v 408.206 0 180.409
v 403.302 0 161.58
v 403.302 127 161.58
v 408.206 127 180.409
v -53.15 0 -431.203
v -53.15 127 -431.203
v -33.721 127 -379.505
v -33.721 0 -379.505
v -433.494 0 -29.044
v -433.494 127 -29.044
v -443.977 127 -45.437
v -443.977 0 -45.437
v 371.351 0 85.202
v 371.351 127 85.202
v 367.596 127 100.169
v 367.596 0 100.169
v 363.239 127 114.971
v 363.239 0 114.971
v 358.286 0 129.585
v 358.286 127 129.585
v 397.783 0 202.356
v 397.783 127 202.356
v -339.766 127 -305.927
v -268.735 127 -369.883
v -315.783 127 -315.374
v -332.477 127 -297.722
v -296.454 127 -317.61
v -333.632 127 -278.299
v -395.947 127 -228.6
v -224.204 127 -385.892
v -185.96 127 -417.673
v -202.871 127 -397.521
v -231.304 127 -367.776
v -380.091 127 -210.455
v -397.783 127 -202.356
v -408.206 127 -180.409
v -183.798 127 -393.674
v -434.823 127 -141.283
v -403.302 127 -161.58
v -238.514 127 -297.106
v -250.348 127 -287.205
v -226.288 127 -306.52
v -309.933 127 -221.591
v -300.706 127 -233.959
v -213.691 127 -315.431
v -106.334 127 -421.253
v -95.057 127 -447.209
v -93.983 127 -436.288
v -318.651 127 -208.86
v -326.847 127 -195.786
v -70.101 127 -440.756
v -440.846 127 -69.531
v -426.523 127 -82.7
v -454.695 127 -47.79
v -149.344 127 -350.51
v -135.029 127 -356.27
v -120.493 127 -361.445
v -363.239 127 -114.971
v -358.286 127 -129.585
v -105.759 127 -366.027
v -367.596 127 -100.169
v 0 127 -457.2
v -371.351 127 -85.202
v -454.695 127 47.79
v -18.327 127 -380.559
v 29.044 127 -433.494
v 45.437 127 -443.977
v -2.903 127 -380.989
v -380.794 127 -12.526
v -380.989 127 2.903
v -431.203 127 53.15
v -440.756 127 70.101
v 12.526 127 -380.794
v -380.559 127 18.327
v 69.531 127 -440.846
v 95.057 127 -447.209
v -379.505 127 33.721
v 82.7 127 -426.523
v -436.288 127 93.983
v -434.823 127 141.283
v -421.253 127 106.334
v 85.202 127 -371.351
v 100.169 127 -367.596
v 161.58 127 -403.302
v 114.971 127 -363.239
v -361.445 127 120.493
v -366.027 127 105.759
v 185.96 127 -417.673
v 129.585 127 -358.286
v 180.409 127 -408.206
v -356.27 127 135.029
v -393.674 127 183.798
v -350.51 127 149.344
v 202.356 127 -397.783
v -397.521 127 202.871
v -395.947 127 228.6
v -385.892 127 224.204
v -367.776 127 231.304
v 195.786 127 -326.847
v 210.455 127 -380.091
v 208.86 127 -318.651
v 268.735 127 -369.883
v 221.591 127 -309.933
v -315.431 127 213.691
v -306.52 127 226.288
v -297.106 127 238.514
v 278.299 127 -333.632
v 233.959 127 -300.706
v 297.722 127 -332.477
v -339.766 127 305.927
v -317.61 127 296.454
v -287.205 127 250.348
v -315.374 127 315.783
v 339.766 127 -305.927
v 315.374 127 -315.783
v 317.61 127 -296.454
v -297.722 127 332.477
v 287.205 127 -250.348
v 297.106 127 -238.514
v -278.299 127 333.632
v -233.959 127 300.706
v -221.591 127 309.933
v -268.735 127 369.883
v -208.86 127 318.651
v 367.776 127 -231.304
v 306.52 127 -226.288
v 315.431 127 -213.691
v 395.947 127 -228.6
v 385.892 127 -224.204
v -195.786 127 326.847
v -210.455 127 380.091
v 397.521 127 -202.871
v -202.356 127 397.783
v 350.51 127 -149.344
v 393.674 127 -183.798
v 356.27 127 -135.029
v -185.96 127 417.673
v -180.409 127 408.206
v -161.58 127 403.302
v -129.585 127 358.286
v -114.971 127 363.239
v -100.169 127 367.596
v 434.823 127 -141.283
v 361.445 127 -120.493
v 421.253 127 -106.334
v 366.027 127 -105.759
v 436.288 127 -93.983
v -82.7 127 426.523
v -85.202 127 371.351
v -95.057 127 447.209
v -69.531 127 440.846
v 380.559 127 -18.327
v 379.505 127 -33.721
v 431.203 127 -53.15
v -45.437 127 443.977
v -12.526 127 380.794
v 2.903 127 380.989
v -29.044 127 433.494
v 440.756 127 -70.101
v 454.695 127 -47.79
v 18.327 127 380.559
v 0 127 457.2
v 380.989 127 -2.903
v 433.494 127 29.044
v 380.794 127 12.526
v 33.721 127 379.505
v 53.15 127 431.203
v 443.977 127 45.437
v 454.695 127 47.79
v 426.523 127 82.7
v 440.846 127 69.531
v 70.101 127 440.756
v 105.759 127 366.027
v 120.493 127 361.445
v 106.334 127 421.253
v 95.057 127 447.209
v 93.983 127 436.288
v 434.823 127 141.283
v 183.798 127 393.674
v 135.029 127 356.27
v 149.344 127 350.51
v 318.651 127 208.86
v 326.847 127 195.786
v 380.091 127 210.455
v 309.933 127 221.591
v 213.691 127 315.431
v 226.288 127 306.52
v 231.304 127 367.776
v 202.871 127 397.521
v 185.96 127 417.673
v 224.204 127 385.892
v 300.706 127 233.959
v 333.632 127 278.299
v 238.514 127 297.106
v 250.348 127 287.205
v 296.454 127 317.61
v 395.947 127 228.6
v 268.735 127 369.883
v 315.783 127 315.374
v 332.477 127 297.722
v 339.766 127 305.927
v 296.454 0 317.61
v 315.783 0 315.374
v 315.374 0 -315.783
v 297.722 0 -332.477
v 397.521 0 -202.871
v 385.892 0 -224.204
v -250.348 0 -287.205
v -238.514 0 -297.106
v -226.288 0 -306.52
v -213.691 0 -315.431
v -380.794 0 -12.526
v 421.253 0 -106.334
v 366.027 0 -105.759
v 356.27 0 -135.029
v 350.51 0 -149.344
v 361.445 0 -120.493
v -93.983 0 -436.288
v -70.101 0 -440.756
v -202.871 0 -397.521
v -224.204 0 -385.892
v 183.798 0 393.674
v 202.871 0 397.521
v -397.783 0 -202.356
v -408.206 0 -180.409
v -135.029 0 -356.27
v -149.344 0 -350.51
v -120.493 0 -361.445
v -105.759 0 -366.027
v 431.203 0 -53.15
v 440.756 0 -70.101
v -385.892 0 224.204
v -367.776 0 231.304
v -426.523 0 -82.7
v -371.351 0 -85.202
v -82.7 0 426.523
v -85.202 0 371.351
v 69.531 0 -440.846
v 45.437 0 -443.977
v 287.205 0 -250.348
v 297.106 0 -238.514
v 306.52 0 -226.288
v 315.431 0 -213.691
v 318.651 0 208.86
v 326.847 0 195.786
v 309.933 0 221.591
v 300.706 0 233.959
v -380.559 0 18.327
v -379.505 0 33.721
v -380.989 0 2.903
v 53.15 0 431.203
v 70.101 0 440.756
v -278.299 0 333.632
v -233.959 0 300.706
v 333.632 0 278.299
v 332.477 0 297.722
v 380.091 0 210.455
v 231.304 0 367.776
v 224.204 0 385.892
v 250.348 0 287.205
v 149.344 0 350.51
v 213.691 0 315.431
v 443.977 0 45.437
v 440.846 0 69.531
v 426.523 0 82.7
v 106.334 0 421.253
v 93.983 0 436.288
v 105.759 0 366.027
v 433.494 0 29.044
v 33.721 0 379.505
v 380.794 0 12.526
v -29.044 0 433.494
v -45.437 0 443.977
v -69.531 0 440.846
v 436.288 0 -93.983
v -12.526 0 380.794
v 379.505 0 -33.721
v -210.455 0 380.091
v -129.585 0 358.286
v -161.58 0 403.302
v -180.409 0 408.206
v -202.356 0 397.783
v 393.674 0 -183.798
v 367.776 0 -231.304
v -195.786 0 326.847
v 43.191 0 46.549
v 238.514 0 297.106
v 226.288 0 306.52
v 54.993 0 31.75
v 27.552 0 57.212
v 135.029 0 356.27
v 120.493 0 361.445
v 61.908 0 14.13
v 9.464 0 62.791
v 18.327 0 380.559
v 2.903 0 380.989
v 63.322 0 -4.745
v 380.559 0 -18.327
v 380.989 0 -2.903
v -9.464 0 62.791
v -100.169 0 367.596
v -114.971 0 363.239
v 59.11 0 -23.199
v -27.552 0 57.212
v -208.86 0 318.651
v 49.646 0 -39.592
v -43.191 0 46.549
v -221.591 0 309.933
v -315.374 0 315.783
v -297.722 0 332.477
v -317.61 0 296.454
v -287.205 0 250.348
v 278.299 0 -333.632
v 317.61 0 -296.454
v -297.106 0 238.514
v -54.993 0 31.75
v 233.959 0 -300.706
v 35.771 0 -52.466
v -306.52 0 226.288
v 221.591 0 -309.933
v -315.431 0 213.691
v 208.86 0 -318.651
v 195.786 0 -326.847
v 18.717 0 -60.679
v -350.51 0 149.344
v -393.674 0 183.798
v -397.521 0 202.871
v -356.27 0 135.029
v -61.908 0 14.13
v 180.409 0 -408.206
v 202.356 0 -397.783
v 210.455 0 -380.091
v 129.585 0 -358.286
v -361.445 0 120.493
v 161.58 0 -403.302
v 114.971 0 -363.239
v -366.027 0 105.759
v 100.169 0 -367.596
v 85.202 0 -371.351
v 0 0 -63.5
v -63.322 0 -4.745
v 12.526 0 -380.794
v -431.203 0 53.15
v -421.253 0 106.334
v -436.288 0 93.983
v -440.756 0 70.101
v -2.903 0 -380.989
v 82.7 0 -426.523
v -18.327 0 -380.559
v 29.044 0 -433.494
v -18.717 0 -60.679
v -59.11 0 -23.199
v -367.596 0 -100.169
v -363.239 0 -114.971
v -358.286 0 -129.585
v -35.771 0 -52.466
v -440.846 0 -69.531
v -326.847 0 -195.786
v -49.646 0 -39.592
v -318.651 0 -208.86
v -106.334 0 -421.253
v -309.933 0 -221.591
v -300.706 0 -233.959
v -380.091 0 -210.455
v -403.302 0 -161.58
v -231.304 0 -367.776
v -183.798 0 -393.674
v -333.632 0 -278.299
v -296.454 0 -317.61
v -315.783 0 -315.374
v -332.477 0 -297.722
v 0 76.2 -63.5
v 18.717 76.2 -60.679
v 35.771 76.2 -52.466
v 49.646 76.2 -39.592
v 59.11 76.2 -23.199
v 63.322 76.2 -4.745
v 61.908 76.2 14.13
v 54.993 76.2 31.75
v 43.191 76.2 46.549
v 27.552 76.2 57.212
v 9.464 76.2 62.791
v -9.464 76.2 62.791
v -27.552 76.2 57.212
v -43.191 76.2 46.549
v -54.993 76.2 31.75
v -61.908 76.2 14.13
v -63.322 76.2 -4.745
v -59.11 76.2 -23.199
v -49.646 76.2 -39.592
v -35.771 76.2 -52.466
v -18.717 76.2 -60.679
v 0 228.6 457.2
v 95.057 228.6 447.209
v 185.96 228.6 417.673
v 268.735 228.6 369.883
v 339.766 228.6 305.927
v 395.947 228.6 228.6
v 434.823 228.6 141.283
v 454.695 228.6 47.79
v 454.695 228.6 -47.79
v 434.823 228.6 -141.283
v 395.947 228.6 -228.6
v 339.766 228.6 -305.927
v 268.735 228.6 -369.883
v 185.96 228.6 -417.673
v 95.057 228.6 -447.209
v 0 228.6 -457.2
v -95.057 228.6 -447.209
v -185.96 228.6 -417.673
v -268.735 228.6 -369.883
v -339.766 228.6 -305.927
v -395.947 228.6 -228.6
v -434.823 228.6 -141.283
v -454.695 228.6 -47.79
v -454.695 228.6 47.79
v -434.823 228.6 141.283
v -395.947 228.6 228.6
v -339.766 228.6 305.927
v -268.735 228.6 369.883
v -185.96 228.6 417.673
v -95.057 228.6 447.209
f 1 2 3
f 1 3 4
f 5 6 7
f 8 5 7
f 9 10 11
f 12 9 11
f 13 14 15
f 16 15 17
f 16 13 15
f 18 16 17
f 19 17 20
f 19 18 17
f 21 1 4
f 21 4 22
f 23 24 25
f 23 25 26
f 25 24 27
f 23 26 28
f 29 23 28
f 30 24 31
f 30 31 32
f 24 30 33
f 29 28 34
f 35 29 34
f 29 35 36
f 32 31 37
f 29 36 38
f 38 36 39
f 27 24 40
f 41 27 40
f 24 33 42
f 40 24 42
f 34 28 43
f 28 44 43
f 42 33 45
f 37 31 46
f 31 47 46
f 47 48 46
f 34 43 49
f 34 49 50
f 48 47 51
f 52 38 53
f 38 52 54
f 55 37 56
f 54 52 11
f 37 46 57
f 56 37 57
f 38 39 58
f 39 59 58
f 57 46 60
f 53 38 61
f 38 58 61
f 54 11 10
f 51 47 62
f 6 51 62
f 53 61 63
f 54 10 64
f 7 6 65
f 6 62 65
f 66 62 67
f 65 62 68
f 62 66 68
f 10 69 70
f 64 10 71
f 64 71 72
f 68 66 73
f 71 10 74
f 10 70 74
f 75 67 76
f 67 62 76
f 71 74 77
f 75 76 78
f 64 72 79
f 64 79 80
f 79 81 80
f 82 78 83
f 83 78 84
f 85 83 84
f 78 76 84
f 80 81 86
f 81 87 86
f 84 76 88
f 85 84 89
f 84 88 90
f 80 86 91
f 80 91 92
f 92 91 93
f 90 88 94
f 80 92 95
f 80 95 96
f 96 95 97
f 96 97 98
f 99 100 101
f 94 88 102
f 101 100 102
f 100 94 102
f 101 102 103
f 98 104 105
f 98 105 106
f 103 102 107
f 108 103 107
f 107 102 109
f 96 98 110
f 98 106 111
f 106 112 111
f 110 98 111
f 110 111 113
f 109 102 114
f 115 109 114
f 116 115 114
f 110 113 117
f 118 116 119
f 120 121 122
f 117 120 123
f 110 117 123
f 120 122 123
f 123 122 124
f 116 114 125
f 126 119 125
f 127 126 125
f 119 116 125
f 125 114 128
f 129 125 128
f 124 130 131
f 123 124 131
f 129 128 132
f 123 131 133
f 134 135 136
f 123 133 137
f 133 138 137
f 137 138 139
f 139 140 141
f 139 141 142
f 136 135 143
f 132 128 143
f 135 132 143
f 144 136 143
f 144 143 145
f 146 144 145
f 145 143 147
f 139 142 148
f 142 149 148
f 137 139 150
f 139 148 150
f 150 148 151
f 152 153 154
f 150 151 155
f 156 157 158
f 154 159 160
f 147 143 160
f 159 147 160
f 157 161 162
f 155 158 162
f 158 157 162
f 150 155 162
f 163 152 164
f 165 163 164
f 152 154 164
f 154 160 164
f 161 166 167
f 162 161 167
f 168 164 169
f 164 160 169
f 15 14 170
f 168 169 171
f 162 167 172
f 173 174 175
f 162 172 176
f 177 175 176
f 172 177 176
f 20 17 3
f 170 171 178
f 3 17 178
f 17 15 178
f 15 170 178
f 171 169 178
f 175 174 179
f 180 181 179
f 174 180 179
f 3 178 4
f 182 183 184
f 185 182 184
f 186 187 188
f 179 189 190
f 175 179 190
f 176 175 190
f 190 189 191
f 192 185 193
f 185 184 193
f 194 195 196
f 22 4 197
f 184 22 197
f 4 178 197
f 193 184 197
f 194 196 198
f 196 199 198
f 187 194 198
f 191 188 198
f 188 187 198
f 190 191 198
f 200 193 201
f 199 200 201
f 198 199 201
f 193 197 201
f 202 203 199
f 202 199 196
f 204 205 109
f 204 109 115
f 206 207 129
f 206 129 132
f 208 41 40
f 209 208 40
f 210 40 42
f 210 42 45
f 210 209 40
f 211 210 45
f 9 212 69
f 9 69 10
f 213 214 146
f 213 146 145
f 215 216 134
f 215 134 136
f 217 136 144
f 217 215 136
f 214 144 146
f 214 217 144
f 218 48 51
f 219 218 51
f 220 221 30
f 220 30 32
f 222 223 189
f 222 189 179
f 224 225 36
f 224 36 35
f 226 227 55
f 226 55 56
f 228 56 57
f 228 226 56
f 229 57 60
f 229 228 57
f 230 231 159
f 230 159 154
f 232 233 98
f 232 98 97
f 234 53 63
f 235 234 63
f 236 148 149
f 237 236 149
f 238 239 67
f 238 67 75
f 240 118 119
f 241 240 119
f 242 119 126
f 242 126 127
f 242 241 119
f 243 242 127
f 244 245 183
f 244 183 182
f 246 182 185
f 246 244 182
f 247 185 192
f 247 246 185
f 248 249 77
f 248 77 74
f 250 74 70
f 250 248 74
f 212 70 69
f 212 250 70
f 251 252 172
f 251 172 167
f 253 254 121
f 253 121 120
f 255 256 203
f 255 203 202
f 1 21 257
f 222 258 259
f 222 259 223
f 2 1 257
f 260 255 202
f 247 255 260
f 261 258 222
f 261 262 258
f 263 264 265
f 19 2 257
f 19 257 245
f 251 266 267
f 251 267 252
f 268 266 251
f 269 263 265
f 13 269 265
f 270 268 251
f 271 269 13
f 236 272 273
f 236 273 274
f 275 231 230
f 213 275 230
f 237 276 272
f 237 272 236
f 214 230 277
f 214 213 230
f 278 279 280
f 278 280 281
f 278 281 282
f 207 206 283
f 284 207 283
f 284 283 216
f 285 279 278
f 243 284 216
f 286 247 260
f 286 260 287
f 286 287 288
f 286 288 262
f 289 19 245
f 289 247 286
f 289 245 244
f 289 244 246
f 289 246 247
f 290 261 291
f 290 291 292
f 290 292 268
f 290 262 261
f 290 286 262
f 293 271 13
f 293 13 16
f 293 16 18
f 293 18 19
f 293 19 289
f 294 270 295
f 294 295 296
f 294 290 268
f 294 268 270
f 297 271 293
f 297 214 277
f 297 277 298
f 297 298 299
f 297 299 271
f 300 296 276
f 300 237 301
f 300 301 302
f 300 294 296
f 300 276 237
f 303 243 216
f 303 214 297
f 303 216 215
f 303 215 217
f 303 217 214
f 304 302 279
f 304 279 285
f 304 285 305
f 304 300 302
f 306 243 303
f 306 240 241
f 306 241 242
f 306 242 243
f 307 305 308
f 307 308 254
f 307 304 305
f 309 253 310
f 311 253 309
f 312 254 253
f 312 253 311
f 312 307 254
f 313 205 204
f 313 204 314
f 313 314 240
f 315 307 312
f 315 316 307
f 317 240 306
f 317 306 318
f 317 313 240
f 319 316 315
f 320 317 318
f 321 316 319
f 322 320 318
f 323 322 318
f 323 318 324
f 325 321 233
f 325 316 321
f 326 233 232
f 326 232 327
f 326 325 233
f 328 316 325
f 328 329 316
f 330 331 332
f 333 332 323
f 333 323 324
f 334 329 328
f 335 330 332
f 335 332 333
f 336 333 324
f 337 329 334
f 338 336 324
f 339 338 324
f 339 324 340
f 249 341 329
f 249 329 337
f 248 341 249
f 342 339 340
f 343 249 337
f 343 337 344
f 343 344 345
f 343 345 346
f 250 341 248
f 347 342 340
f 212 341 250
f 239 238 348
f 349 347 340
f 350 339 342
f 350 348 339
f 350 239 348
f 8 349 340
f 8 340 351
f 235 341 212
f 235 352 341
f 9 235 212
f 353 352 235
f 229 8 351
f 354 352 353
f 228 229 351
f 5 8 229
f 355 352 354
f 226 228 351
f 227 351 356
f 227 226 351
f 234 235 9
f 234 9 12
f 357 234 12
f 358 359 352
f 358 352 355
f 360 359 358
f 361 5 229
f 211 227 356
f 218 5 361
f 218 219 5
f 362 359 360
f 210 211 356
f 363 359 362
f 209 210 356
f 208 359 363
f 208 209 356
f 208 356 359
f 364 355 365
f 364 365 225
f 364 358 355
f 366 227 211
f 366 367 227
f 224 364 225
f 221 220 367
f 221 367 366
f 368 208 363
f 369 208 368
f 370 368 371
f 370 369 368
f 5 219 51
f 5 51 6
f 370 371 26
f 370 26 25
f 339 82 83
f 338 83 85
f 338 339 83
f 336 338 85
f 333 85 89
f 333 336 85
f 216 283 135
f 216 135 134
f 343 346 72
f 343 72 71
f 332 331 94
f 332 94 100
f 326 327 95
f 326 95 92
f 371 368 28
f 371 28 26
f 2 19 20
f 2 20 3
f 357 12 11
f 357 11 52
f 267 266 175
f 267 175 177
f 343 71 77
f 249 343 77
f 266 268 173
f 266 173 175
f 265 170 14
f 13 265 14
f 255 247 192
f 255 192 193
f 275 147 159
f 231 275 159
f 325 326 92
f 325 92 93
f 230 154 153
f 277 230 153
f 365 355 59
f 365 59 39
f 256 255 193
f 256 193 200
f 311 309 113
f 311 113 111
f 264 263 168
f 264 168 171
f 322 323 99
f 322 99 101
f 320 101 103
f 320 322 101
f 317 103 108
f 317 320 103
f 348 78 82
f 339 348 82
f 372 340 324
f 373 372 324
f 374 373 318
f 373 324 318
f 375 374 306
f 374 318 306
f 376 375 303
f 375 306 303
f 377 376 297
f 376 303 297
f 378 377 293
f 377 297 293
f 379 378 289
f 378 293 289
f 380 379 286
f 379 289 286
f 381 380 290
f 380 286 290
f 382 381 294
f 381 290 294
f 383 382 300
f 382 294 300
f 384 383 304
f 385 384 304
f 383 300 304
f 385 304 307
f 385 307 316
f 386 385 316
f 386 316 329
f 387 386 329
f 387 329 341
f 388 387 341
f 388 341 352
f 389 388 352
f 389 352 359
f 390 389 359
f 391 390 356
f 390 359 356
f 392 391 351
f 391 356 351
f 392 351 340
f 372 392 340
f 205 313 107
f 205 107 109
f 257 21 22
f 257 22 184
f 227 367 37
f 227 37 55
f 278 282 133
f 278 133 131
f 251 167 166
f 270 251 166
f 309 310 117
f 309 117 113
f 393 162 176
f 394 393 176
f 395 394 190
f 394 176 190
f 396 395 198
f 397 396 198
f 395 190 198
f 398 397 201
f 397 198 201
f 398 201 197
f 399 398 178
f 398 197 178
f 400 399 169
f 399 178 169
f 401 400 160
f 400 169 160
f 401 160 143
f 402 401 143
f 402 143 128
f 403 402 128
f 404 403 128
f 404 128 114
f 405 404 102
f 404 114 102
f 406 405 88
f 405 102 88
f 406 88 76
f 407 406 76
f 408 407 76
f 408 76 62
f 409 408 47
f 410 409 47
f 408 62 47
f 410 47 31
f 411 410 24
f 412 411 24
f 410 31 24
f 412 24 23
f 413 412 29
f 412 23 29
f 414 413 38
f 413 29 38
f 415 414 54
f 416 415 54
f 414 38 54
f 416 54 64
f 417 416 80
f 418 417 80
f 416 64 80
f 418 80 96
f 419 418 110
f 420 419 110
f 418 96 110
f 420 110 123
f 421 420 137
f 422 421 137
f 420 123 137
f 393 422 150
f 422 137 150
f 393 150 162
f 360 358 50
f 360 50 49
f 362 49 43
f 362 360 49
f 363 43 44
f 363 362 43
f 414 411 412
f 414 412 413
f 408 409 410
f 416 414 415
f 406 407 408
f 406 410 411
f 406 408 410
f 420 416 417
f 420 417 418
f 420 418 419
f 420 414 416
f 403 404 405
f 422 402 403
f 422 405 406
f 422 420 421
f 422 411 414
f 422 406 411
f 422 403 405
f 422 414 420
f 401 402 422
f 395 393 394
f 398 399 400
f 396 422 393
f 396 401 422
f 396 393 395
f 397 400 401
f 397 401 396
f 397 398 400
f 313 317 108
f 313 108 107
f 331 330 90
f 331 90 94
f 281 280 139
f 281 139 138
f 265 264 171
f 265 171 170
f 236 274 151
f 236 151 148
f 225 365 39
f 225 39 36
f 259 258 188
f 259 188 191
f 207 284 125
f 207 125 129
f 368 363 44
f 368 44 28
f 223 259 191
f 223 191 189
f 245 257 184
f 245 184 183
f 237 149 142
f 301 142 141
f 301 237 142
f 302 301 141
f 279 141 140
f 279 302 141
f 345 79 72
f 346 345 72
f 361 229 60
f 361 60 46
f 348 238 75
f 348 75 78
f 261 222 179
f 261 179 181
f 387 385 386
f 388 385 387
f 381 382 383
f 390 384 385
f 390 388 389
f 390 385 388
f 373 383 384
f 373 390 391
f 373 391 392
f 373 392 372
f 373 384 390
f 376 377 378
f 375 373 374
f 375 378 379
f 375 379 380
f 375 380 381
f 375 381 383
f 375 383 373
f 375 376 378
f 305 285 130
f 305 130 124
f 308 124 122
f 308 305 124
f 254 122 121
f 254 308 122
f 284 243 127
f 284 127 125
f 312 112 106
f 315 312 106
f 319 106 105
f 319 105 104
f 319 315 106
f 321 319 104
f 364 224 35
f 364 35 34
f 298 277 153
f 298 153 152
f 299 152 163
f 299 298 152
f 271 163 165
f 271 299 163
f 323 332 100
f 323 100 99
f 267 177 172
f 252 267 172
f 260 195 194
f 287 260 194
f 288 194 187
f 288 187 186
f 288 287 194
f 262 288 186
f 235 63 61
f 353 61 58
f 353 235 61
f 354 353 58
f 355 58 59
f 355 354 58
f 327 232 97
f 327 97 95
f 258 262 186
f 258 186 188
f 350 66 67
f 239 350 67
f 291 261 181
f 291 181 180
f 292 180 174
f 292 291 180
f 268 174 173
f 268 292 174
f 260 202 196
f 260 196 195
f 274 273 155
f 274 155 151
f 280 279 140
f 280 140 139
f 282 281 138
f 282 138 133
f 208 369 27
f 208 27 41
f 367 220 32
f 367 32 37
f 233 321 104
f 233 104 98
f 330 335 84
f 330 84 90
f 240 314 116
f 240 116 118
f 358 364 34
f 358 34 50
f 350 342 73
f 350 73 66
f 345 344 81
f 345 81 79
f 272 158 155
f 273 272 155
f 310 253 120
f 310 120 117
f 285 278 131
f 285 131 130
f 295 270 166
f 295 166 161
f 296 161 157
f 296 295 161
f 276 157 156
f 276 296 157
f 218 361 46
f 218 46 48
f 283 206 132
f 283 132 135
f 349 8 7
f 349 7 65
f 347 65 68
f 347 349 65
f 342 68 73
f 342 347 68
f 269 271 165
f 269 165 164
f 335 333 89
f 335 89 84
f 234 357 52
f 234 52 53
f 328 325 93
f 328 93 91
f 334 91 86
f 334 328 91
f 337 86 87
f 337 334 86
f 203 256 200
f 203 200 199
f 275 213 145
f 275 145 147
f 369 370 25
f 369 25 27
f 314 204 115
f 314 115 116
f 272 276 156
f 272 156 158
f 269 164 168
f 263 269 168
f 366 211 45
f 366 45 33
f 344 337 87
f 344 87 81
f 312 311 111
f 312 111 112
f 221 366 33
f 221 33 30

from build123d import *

# Parameters (mm, degrees)
BOSS_EXTRUDE2_DEPTH = 127
SKETCH3_R           = 457.2
BOSS_EXTRUDE3_DEPTH = 101.6
SKETCH4_R           = 63.5
CUT_EXTRUDE1_DEPTH  = 76.2


with BuildPart() as part:
    # Sketch1 → Boss-Extrude2 (new body)
    with BuildSketch(Plane(origin=(0, 0, 0), x_dir=(1, 0, 0), z_dir=(0, 1, 0))):
        with BuildLine():
            Line((-358.285919954, 129.584719634), (-403.302421761, 161.579989966))
            Line((-403.302421761, 161.579989966), (-408.206038182, 180.409487441))
            Line((-408.206038182, 180.409487441), (-397.783371142, 202.356473607))
            Line((-397.783371142, 202.356473607), (-380.091440099, 210.455301))
            Line((-380.091440099, 210.455301), (-326.846738593, 195.786131968))
            ThreePointArc((-326.846738593, 195.786131968), (-314.356463225, 215.269630995), (-300.706278291, 233.958830131))
            Line((-300.706278291, 233.958830131), (-333.632433402, 278.299004557))
            Line((-333.632433402, 278.299004557), (-332.477415039, 297.722221637))
            Line((-332.477415039, 297.722221637), (-315.782877932, 315.374264601))
            Line((-315.782877932, 315.374264601), (-296.454176329, 317.609599812))
            Line((-296.454176329, 317.609599812), (-250.348478528, 287.20487339))
            ThreePointArc((-250.348478528, 287.20487339), (-232.44878844, 301.875074746), (-213.691410965, 315.431420248))
            Line((-213.691410965, 315.431420248), (-231.304177909, 367.776173558))
            Line((-231.304177909, 367.776173558), (-224.203586005, 385.891830426))
            Line((-224.203586005, 385.891830426), (-202.871356441, 397.521025234))
            Line((-202.871356441, 397.521025234), (-183.797912262, 393.674058078))
            Line((-183.797912262, 393.674058078), (-149.344365104, 350.51000073))
            ThreePointArc((-149.344365104, 350.51000073), (-127.787406676, 358.930882894), (-105.758939458, 366.027385211))
            Line((-105.758939458, 366.027385211), (-106.334257891, 421.252848245))
            Line((-106.334257891, 421.252848245), (-93.983147854, 436.287658187))
            Line((-93.983147854, 436.287658187), (-70.101373095, 440.755658225))
            Line((-70.101373095, 440.755658225), (-53.150227948, 431.202956651))
            Line((-53.150227948, 431.202956651), (-33.72138468, 379.504767052))
            ThreePointArc((-33.72138468, 379.504767052), (-10.617303199, 380.852035406), (12.525953909, 380.794039447))
            Line((12.525953909, 380.794039447), (29.044400164, 433.494359103))
            Line((29.044400164, 433.494359103), (45.437015627, 443.97661017))
            Line((45.437015627, 443.97661017), (69.530621076, 440.846056464))
            Line((69.530621076, 440.846056464), (82.700170997, 426.522705459))
            Line((82.700170997, 426.522705459), (85.202479827, 371.35096261))
            ThreePointArc((85.202479827, 371.35096261), (107.59209589, 365.49273714), (129.584719634, 358.285919954))
            Line((129.584719634, 358.285919954), (161.579989966, 403.302421761))
            Line((161.579989966, 403.302421761), (180.409487441, 408.206038182))
            Line((180.409487441, 408.206038182), (202.356473607, 397.783371142))
            Line((202.356473607, 397.783371142), (210.455301, 380.091440099))
            Line((210.455301, 380.091440099), (195.786131968, 326.846738593))
            ThreePointArc((195.786131968, 326.846738593), (215.269630995, 314.356463225), (233.958830131, 300.706278291))
            Line((233.958830131, 300.706278291), (278.299004557, 333.632433402))
            Line((278.299004557, 333.632433402), (297.722221637, 332.477415039))
            Line((297.722221637, 332.477415039), (315.374264601, 315.782877932))
            Line((315.374264601, 315.782877932), (317.609599812, 296.454176329))
            Line((317.609599812, 296.454176329), (287.20487339, 250.348478528))
            ThreePointArc((287.20487339, 250.348478528), (301.875074746, 232.44878844), (315.431420248, 213.691410965))
            Line((315.431420248, 213.691410965), (367.776173558, 231.304177909))
            Line((367.776173558, 231.304177909), (385.891830426, 224.203586005))
            Line((385.891830426, 224.203586005), (397.521025234, 202.871356441))
            Line((397.521025234, 202.871356441), (393.674058078, 183.797912262))
            Line((393.674058078, 183.797912262), (350.51000073, 149.344365104))
            ThreePointArc((350.51000073, 149.344365104), (358.930882894, 127.787406676), (366.027385211, 105.758939458))
            Line((366.027385211, 105.758939458), (421.252848245, 106.334257891))
            Line((421.252848245, 106.334257891), (436.287658187, 93.983147854))
            Line((436.287658187, 93.983147854), (440.755658225, 70.101373095))
            Line((440.755658225, 70.101373095), (431.202956651, 53.150227948))
            Line((431.202956651, 53.150227948), (379.504767052, 33.72138468))
            ThreePointArc((379.504767052, 33.72138468), (380.852035406, 10.617303199), (380.794039447, -12.525953909))
            Line((380.794039447, -12.525953909), (433.494359103, -29.044400164))
            Line((433.494359103, -29.044400164), (443.97661017, -45.437015627))
            Line((443.97661017, -45.437015627), (440.846056464, -69.530621076))
            Line((440.846056464, -69.530621076), (426.522705459, -82.700170997))
            Line((426.522705459, -82.700170997), (371.35096261, -85.202479827))
            ThreePointArc((371.35096261, -85.202479827), (365.49273714, -107.59209589), (358.285919954, -129.584719634))
            Line((358.285919954, -129.584719634), (403.302421761, -161.579989966))
            Line((403.302421761, -161.579989966), (408.206038182, -180.409487441))
            Line((408.206038182, -180.409487441), (397.783371142, -202.356473607))
            Line((397.783371142, -202.356473607), (380.091440099, -210.455301))
            Line((380.091440099, -210.455301), (326.846738593, -195.786131968))
            ThreePointArc((326.846738593, -195.786131968), (314.356463225, -215.269630995), (300.706278291, -233.958830131))
            Line((300.706278291, -233.958830131), (333.632433402, -278.299004557))
            Line((333.632433402, -278.299004557), (332.477415039, -297.722221637))
            Line((332.477415039, -297.722221637), (315.782877932, -315.374264601))
            Line((315.782877932, -315.374264601), (296.454176329, -317.609599812))
            Line((296.454176329, -317.609599812), (250.348478528, -287.20487339))
            ThreePointArc((250.348478528, -287.20487339), (232.44878844, -301.875074746), (213.691410965, -315.431420248))
            Line((213.691410965, -315.431420248), (231.304177909, -367.776173558))
            Line((231.304177909, -367.776173558), (224.203586005, -385.891830426))
            Line((224.203586005, -385.891830426), (202.871356441, -397.521025234))
            Line((202.871356441, -397.521025234), (183.797912262, -393.674058078))
            Line((183.797912262, -393.674058078), (149.344365104, -350.51000073))
            ThreePointArc((149.344365104, -350.51000073), (127.787406676, -358.930882894), (105.758939458, -366.027385211))
            Line((105.758939458, -366.027385211), (106.334257891, -421.252848245))
            Line((106.334257891, -421.252848245), (93.983147854, -436.287658187))
            Line((93.983147854, -436.287658187), (70.101373095, -440.755658225))
            Line((70.101373095, -440.755658225), (53.150227948, -431.202956651))
            Line((53.150227948, -431.202956651), (33.72138468, -379.504767052))
            ThreePointArc((33.72138468, -379.504767052), (10.617303199, -380.852035406), (-12.525953909, -380.794039447))
            Line((-12.525953909, -380.794039447), (-29.044400164, -433.494359103))
            Line((-29.044400164, -433.494359103), (-45.437015627, -443.97661017))
            Line((-45.437015627, -443.97661017), (-69.530621076, -440.846056464))
            Line((-69.530621076, -440.846056464), (-82.700170997, -426.522705459))
            Line((-82.700170997, -426.522705459), (-85.202479827, -371.35096261))
            ThreePointArc((-85.202479827, -371.35096261), (-107.59209589, -365.49273714), (-129.584719634, -358.285919954))
            Line((-129.584719634, -358.285919954), (-161.579989966, -403.302421761))
            Line((-161.579989966, -403.302421761), (-180.409487441, -408.206038182))
            Line((-180.409487441, -408.206038182), (-202.356473607, -397.783371142))
            Line((-202.356473607, -397.783371142), (-210.455301, -380.091440099))
            Line((-210.455301, -380.091440099), (-195.786131968, -326.846738593))
            ThreePointArc((-195.786131968, -326.846738593), (-215.269630995, -314.356463225), (-233.958830131, -300.706278291))
            Line((-233.958830131, -300.706278291), (-278.299004557, -333.632433402))
            Line((-278.299004557, -333.632433402), (-297.722221637, -332.477415039))
            Line((-297.722221637, -332.477415039), (-315.374264601, -315.782877932))
            Line((-315.374264601, -315.782877932), (-317.609599812, -296.454176329))
            Line((-317.609599812, -296.454176329), (-287.20487339, -250.348478528))
            ThreePointArc((-287.20487339, -250.348478528), (-301.875074746, -232.44878844), (-315.431420248, -213.691410965))
            Line((-315.431420248, -213.691410965), (-367.776173558, -231.304177909))
            Line((-367.776173558, -231.304177909), (-385.891830426, -224.203586005))
            Line((-385.891830426, -224.203586005), (-397.521025234, -202.871356441))
            Line((-397.521025234, -202.871356441), (-393.674058078, -183.797912262))
            Line((-393.674058078, -183.797912262), (-350.51000073, -149.344365104))
            ThreePointArc((-350.51000073, -149.344365104), (-358.930882894, -127.787406676), (-366.027385211, -105.758939458))
            Line((-366.027385211, -105.758939458), (-421.252848245, -106.334257891))
            Line((-421.252848245, -106.334257891), (-436.287658187, -93.983147854))
            Line((-436.287658187, -93.983147854), (-440.755658225, -70.101373095))
            Line((-440.755658225, -70.101373095), (-431.202956651, -53.150227948))
            Line((-431.202956651, -53.150227948), (-379.504767052, -33.72138468))
            ThreePointArc((-379.504767052, -33.72138468), (-380.852035406, -10.617303199), (-380.794039447, 12.525953909))
            Line((-380.794039447, 12.525953909), (-433.494359103, 29.044400164))
            Line((-433.494359103, 29.044400164), (-443.97661017, 45.437015627))
            Line((-443.97661017, 45.437015627), (-440.846056464, 69.530621076))
            Line((-440.846056464, 69.530621076), (-426.522705459, 82.700170997))
            Line((-426.522705459, 82.700170997), (-371.35096261, 85.202479827))
            ThreePointArc((-371.35096261, 85.202479827), (-365.49273714, 107.59209589), (-358.285919954, 129.584719634))
        make_face()
    extrude(amount=BOSS_EXTRUDE2_DEPTH)

    # Sketch3 → Boss-Extrude3 (add)
    with BuildSketch(Plane(origin=(0, 127, 0), x_dir=(1, 0, 0), z_dir=(0, 1, 0))):
        with Locations(Location((0, 0, 0), (0, 0, 270))):
            Circle(SKETCH3_R)
    extrude(amount=BOSS_EXTRUDE3_DEPTH)

    # Sketch4 → Cut-Extrude1 (cut)
    with BuildSketch(Plane(origin=(0, 0, 0), x_dir=(-1, 0, 0), z_dir=(0, -1, 0))):
        with Locations(Location((0, 0, 0), (0, 0, 90))):
            Circle(SKETCH4_R)
    extrude(amount=-CUT_EXTRUDE1_DEPTH, mode=Mode.SUBTRACT)


solid = part.part
